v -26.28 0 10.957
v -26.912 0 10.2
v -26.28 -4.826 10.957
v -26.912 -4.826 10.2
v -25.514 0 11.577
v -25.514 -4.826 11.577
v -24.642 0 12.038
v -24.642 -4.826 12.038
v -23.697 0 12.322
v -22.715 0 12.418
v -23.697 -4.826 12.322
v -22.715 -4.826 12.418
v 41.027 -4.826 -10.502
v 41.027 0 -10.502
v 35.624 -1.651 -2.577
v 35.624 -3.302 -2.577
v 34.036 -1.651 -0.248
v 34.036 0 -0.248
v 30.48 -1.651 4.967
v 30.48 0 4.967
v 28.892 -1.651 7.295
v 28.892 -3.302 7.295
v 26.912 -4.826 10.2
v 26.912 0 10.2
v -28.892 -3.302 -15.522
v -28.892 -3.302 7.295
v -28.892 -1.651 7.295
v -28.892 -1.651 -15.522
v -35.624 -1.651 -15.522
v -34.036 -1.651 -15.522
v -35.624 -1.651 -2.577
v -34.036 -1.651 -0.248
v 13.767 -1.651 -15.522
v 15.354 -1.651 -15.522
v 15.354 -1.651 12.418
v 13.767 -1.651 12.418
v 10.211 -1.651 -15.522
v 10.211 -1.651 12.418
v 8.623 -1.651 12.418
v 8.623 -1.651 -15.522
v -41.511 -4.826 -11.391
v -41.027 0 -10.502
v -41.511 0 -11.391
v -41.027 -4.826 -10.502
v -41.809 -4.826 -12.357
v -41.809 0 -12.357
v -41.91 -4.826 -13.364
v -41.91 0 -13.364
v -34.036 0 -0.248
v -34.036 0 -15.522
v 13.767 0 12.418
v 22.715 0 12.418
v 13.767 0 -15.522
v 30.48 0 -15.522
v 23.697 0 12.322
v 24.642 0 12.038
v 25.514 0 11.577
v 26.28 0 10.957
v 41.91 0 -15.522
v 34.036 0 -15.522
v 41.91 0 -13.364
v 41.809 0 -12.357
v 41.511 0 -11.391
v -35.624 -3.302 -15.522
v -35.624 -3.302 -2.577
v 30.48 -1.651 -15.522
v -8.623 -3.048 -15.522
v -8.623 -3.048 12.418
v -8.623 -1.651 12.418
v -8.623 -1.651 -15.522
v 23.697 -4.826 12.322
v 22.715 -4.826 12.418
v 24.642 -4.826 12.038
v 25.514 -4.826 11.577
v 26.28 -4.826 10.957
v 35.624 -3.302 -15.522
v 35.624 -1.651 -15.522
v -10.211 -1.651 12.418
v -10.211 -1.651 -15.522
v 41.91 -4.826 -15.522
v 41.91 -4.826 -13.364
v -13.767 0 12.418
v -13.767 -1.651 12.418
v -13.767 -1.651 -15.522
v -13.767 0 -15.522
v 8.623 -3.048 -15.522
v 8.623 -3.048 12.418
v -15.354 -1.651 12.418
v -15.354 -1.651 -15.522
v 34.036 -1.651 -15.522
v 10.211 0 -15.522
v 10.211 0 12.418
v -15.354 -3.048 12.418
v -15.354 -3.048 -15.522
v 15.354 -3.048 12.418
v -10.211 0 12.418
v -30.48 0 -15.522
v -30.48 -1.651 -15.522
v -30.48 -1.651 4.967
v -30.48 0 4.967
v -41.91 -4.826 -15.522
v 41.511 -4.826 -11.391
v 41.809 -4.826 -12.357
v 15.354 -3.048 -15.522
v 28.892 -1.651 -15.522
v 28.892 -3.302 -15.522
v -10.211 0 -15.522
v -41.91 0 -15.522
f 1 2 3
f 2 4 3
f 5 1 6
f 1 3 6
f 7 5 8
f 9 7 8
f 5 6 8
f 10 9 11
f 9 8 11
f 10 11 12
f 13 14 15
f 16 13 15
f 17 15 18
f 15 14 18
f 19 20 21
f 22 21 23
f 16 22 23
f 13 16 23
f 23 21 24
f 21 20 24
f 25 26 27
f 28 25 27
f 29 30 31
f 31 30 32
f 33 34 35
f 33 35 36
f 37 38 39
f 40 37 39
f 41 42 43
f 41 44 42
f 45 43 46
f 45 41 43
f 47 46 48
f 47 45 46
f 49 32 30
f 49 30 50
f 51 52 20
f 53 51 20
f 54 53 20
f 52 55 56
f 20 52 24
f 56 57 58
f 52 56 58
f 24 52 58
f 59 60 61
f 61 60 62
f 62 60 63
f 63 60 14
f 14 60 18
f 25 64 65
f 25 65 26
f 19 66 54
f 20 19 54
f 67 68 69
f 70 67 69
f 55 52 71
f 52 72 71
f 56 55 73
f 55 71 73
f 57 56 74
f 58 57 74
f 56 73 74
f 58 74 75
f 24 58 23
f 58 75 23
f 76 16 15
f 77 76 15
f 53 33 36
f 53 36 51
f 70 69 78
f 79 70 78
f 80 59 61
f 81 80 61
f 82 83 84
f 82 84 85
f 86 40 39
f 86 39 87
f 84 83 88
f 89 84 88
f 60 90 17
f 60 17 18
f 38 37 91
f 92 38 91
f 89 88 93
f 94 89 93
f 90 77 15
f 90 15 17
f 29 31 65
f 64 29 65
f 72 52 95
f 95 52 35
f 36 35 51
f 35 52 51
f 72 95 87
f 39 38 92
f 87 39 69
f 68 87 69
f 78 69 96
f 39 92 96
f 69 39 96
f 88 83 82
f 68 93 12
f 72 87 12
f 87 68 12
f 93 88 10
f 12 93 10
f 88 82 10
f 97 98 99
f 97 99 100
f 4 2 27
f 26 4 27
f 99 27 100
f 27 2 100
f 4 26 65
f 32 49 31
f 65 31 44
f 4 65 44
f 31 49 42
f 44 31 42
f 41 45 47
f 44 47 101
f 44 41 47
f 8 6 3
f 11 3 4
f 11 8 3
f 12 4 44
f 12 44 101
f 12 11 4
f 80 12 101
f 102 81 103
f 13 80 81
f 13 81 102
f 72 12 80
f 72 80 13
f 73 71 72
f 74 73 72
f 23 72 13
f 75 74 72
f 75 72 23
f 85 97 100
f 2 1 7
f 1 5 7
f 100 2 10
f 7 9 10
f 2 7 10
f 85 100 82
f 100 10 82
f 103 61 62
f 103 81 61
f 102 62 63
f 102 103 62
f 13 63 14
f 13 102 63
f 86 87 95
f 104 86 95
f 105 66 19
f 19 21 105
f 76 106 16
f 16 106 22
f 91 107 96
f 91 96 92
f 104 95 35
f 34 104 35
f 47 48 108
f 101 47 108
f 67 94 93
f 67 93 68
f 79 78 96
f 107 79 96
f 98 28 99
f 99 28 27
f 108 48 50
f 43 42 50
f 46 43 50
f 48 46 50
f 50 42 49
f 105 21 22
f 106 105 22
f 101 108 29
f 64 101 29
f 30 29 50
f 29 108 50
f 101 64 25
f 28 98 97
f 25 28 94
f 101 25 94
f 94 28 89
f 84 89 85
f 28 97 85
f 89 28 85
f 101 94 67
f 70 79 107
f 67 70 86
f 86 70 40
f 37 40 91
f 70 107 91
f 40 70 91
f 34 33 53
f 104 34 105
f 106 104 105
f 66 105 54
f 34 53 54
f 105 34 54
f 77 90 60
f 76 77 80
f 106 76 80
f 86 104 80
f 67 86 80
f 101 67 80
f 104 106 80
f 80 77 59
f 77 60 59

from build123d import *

# Parameters (mm, degrees)
F1_DEPTH = 4.826
F2_W     = 3.556
F2_H     = 1.651
F3_DEPTH = 25.4
F5_W     = 3.556
F5_H     = 1.651
F6_DEPTH = 50.8
F7_R     = 5.08
F8_R     = 5.08


with BuildPart() as f1:
    # F0 (on Front) → F1 (new body)
    with BuildSketch(Plane.XZ):
        Polygon((-25.4, 12.417778), (-41.91, -11.796889), (-41.91, -15.522222), (41.91, -15.522222), (41.91, -11.796889), (25.4, 12.417778), align=None)
        Polygon((-37.240951, -11.712222), (-23.386406, 8.607778), (23.386406, 8.607778), (37.240951, -11.712222), align=None, mode=Mode.SUBTRACT)
        Polygon((23.386406, 8.607778), (-23.386406, 8.607778), (-37.240951, -11.712222), (37.240951, -11.712222), align=None)
    extrude(amount=F1_DEPTH)

    # F2 (on Top) → F3 (cut, symmetric)
    with BuildSketch(Plane.XY):
        with Locations((11.9888, -0.8255)):
            Rectangle(F2_W, F2_H)
        Polygon((15.3543, -1.651), (13.7668, -1.651), (10.2108, -1.651), (8.6233, -1.651), (8.6233, -3.048), (15.3543, -3.048), align=None)
        with Locations((-11.9888, -0.8255)):
            Rectangle(F2_W, F2_H)
        Polygon((-10.2108, -1.651), (-13.7668, -1.651), (-15.3543, -1.651), (-15.3543, -3.048), (-8.6233, -3.048), (-8.6233, -1.651), align=None)
    extrude(amount=F3_DEPTH, both=True, mode=Mode.SUBTRACT)

    # F5 (on offset) → F6 (cut)
    with BuildSketch(Plane.XY.offset(12.7)):
        with Locations((-32.258, -0.8255)):
            Rectangle(F5_W, F5_H)
        Polygon((-30.48, -1.651), (-34.036, -1.651), (-35.6235, -1.651), (-35.6235, -3.302), (-28.8925, -3.302), (-28.8925, -1.651), align=None)
        with Locations((32.258, -0.8255)):
            Rectangle(F5_W, F5_H)
        Polygon((35.6235, -1.651), (34.036, -1.651), (30.48, -1.651), (28.8925, -1.651), (28.8925, -3.302), (35.6235, -3.302), align=None)
    extrude(amount=-F6_DEPTH, mode=Mode.SUBTRACT)

    # F7
    f7_edges = [f1.edges().sort_by_distance(p)[0] for p in [
        (-41.91, -2.413, -11.796889),
        (41.91, -2.413, -11.796889),
    ]]
    fillet(f7_edges, radius=F7_R)

    # F8
    f8_edges = [f1.edges().sort_by_distance(p)[0] for p in [
        (-25.4, -2.413, 12.417778),
        (25.4, -2.413, 12.417778),
    ]]
    fillet(f8_edges, radius=F8_R)


solid = f1.part
